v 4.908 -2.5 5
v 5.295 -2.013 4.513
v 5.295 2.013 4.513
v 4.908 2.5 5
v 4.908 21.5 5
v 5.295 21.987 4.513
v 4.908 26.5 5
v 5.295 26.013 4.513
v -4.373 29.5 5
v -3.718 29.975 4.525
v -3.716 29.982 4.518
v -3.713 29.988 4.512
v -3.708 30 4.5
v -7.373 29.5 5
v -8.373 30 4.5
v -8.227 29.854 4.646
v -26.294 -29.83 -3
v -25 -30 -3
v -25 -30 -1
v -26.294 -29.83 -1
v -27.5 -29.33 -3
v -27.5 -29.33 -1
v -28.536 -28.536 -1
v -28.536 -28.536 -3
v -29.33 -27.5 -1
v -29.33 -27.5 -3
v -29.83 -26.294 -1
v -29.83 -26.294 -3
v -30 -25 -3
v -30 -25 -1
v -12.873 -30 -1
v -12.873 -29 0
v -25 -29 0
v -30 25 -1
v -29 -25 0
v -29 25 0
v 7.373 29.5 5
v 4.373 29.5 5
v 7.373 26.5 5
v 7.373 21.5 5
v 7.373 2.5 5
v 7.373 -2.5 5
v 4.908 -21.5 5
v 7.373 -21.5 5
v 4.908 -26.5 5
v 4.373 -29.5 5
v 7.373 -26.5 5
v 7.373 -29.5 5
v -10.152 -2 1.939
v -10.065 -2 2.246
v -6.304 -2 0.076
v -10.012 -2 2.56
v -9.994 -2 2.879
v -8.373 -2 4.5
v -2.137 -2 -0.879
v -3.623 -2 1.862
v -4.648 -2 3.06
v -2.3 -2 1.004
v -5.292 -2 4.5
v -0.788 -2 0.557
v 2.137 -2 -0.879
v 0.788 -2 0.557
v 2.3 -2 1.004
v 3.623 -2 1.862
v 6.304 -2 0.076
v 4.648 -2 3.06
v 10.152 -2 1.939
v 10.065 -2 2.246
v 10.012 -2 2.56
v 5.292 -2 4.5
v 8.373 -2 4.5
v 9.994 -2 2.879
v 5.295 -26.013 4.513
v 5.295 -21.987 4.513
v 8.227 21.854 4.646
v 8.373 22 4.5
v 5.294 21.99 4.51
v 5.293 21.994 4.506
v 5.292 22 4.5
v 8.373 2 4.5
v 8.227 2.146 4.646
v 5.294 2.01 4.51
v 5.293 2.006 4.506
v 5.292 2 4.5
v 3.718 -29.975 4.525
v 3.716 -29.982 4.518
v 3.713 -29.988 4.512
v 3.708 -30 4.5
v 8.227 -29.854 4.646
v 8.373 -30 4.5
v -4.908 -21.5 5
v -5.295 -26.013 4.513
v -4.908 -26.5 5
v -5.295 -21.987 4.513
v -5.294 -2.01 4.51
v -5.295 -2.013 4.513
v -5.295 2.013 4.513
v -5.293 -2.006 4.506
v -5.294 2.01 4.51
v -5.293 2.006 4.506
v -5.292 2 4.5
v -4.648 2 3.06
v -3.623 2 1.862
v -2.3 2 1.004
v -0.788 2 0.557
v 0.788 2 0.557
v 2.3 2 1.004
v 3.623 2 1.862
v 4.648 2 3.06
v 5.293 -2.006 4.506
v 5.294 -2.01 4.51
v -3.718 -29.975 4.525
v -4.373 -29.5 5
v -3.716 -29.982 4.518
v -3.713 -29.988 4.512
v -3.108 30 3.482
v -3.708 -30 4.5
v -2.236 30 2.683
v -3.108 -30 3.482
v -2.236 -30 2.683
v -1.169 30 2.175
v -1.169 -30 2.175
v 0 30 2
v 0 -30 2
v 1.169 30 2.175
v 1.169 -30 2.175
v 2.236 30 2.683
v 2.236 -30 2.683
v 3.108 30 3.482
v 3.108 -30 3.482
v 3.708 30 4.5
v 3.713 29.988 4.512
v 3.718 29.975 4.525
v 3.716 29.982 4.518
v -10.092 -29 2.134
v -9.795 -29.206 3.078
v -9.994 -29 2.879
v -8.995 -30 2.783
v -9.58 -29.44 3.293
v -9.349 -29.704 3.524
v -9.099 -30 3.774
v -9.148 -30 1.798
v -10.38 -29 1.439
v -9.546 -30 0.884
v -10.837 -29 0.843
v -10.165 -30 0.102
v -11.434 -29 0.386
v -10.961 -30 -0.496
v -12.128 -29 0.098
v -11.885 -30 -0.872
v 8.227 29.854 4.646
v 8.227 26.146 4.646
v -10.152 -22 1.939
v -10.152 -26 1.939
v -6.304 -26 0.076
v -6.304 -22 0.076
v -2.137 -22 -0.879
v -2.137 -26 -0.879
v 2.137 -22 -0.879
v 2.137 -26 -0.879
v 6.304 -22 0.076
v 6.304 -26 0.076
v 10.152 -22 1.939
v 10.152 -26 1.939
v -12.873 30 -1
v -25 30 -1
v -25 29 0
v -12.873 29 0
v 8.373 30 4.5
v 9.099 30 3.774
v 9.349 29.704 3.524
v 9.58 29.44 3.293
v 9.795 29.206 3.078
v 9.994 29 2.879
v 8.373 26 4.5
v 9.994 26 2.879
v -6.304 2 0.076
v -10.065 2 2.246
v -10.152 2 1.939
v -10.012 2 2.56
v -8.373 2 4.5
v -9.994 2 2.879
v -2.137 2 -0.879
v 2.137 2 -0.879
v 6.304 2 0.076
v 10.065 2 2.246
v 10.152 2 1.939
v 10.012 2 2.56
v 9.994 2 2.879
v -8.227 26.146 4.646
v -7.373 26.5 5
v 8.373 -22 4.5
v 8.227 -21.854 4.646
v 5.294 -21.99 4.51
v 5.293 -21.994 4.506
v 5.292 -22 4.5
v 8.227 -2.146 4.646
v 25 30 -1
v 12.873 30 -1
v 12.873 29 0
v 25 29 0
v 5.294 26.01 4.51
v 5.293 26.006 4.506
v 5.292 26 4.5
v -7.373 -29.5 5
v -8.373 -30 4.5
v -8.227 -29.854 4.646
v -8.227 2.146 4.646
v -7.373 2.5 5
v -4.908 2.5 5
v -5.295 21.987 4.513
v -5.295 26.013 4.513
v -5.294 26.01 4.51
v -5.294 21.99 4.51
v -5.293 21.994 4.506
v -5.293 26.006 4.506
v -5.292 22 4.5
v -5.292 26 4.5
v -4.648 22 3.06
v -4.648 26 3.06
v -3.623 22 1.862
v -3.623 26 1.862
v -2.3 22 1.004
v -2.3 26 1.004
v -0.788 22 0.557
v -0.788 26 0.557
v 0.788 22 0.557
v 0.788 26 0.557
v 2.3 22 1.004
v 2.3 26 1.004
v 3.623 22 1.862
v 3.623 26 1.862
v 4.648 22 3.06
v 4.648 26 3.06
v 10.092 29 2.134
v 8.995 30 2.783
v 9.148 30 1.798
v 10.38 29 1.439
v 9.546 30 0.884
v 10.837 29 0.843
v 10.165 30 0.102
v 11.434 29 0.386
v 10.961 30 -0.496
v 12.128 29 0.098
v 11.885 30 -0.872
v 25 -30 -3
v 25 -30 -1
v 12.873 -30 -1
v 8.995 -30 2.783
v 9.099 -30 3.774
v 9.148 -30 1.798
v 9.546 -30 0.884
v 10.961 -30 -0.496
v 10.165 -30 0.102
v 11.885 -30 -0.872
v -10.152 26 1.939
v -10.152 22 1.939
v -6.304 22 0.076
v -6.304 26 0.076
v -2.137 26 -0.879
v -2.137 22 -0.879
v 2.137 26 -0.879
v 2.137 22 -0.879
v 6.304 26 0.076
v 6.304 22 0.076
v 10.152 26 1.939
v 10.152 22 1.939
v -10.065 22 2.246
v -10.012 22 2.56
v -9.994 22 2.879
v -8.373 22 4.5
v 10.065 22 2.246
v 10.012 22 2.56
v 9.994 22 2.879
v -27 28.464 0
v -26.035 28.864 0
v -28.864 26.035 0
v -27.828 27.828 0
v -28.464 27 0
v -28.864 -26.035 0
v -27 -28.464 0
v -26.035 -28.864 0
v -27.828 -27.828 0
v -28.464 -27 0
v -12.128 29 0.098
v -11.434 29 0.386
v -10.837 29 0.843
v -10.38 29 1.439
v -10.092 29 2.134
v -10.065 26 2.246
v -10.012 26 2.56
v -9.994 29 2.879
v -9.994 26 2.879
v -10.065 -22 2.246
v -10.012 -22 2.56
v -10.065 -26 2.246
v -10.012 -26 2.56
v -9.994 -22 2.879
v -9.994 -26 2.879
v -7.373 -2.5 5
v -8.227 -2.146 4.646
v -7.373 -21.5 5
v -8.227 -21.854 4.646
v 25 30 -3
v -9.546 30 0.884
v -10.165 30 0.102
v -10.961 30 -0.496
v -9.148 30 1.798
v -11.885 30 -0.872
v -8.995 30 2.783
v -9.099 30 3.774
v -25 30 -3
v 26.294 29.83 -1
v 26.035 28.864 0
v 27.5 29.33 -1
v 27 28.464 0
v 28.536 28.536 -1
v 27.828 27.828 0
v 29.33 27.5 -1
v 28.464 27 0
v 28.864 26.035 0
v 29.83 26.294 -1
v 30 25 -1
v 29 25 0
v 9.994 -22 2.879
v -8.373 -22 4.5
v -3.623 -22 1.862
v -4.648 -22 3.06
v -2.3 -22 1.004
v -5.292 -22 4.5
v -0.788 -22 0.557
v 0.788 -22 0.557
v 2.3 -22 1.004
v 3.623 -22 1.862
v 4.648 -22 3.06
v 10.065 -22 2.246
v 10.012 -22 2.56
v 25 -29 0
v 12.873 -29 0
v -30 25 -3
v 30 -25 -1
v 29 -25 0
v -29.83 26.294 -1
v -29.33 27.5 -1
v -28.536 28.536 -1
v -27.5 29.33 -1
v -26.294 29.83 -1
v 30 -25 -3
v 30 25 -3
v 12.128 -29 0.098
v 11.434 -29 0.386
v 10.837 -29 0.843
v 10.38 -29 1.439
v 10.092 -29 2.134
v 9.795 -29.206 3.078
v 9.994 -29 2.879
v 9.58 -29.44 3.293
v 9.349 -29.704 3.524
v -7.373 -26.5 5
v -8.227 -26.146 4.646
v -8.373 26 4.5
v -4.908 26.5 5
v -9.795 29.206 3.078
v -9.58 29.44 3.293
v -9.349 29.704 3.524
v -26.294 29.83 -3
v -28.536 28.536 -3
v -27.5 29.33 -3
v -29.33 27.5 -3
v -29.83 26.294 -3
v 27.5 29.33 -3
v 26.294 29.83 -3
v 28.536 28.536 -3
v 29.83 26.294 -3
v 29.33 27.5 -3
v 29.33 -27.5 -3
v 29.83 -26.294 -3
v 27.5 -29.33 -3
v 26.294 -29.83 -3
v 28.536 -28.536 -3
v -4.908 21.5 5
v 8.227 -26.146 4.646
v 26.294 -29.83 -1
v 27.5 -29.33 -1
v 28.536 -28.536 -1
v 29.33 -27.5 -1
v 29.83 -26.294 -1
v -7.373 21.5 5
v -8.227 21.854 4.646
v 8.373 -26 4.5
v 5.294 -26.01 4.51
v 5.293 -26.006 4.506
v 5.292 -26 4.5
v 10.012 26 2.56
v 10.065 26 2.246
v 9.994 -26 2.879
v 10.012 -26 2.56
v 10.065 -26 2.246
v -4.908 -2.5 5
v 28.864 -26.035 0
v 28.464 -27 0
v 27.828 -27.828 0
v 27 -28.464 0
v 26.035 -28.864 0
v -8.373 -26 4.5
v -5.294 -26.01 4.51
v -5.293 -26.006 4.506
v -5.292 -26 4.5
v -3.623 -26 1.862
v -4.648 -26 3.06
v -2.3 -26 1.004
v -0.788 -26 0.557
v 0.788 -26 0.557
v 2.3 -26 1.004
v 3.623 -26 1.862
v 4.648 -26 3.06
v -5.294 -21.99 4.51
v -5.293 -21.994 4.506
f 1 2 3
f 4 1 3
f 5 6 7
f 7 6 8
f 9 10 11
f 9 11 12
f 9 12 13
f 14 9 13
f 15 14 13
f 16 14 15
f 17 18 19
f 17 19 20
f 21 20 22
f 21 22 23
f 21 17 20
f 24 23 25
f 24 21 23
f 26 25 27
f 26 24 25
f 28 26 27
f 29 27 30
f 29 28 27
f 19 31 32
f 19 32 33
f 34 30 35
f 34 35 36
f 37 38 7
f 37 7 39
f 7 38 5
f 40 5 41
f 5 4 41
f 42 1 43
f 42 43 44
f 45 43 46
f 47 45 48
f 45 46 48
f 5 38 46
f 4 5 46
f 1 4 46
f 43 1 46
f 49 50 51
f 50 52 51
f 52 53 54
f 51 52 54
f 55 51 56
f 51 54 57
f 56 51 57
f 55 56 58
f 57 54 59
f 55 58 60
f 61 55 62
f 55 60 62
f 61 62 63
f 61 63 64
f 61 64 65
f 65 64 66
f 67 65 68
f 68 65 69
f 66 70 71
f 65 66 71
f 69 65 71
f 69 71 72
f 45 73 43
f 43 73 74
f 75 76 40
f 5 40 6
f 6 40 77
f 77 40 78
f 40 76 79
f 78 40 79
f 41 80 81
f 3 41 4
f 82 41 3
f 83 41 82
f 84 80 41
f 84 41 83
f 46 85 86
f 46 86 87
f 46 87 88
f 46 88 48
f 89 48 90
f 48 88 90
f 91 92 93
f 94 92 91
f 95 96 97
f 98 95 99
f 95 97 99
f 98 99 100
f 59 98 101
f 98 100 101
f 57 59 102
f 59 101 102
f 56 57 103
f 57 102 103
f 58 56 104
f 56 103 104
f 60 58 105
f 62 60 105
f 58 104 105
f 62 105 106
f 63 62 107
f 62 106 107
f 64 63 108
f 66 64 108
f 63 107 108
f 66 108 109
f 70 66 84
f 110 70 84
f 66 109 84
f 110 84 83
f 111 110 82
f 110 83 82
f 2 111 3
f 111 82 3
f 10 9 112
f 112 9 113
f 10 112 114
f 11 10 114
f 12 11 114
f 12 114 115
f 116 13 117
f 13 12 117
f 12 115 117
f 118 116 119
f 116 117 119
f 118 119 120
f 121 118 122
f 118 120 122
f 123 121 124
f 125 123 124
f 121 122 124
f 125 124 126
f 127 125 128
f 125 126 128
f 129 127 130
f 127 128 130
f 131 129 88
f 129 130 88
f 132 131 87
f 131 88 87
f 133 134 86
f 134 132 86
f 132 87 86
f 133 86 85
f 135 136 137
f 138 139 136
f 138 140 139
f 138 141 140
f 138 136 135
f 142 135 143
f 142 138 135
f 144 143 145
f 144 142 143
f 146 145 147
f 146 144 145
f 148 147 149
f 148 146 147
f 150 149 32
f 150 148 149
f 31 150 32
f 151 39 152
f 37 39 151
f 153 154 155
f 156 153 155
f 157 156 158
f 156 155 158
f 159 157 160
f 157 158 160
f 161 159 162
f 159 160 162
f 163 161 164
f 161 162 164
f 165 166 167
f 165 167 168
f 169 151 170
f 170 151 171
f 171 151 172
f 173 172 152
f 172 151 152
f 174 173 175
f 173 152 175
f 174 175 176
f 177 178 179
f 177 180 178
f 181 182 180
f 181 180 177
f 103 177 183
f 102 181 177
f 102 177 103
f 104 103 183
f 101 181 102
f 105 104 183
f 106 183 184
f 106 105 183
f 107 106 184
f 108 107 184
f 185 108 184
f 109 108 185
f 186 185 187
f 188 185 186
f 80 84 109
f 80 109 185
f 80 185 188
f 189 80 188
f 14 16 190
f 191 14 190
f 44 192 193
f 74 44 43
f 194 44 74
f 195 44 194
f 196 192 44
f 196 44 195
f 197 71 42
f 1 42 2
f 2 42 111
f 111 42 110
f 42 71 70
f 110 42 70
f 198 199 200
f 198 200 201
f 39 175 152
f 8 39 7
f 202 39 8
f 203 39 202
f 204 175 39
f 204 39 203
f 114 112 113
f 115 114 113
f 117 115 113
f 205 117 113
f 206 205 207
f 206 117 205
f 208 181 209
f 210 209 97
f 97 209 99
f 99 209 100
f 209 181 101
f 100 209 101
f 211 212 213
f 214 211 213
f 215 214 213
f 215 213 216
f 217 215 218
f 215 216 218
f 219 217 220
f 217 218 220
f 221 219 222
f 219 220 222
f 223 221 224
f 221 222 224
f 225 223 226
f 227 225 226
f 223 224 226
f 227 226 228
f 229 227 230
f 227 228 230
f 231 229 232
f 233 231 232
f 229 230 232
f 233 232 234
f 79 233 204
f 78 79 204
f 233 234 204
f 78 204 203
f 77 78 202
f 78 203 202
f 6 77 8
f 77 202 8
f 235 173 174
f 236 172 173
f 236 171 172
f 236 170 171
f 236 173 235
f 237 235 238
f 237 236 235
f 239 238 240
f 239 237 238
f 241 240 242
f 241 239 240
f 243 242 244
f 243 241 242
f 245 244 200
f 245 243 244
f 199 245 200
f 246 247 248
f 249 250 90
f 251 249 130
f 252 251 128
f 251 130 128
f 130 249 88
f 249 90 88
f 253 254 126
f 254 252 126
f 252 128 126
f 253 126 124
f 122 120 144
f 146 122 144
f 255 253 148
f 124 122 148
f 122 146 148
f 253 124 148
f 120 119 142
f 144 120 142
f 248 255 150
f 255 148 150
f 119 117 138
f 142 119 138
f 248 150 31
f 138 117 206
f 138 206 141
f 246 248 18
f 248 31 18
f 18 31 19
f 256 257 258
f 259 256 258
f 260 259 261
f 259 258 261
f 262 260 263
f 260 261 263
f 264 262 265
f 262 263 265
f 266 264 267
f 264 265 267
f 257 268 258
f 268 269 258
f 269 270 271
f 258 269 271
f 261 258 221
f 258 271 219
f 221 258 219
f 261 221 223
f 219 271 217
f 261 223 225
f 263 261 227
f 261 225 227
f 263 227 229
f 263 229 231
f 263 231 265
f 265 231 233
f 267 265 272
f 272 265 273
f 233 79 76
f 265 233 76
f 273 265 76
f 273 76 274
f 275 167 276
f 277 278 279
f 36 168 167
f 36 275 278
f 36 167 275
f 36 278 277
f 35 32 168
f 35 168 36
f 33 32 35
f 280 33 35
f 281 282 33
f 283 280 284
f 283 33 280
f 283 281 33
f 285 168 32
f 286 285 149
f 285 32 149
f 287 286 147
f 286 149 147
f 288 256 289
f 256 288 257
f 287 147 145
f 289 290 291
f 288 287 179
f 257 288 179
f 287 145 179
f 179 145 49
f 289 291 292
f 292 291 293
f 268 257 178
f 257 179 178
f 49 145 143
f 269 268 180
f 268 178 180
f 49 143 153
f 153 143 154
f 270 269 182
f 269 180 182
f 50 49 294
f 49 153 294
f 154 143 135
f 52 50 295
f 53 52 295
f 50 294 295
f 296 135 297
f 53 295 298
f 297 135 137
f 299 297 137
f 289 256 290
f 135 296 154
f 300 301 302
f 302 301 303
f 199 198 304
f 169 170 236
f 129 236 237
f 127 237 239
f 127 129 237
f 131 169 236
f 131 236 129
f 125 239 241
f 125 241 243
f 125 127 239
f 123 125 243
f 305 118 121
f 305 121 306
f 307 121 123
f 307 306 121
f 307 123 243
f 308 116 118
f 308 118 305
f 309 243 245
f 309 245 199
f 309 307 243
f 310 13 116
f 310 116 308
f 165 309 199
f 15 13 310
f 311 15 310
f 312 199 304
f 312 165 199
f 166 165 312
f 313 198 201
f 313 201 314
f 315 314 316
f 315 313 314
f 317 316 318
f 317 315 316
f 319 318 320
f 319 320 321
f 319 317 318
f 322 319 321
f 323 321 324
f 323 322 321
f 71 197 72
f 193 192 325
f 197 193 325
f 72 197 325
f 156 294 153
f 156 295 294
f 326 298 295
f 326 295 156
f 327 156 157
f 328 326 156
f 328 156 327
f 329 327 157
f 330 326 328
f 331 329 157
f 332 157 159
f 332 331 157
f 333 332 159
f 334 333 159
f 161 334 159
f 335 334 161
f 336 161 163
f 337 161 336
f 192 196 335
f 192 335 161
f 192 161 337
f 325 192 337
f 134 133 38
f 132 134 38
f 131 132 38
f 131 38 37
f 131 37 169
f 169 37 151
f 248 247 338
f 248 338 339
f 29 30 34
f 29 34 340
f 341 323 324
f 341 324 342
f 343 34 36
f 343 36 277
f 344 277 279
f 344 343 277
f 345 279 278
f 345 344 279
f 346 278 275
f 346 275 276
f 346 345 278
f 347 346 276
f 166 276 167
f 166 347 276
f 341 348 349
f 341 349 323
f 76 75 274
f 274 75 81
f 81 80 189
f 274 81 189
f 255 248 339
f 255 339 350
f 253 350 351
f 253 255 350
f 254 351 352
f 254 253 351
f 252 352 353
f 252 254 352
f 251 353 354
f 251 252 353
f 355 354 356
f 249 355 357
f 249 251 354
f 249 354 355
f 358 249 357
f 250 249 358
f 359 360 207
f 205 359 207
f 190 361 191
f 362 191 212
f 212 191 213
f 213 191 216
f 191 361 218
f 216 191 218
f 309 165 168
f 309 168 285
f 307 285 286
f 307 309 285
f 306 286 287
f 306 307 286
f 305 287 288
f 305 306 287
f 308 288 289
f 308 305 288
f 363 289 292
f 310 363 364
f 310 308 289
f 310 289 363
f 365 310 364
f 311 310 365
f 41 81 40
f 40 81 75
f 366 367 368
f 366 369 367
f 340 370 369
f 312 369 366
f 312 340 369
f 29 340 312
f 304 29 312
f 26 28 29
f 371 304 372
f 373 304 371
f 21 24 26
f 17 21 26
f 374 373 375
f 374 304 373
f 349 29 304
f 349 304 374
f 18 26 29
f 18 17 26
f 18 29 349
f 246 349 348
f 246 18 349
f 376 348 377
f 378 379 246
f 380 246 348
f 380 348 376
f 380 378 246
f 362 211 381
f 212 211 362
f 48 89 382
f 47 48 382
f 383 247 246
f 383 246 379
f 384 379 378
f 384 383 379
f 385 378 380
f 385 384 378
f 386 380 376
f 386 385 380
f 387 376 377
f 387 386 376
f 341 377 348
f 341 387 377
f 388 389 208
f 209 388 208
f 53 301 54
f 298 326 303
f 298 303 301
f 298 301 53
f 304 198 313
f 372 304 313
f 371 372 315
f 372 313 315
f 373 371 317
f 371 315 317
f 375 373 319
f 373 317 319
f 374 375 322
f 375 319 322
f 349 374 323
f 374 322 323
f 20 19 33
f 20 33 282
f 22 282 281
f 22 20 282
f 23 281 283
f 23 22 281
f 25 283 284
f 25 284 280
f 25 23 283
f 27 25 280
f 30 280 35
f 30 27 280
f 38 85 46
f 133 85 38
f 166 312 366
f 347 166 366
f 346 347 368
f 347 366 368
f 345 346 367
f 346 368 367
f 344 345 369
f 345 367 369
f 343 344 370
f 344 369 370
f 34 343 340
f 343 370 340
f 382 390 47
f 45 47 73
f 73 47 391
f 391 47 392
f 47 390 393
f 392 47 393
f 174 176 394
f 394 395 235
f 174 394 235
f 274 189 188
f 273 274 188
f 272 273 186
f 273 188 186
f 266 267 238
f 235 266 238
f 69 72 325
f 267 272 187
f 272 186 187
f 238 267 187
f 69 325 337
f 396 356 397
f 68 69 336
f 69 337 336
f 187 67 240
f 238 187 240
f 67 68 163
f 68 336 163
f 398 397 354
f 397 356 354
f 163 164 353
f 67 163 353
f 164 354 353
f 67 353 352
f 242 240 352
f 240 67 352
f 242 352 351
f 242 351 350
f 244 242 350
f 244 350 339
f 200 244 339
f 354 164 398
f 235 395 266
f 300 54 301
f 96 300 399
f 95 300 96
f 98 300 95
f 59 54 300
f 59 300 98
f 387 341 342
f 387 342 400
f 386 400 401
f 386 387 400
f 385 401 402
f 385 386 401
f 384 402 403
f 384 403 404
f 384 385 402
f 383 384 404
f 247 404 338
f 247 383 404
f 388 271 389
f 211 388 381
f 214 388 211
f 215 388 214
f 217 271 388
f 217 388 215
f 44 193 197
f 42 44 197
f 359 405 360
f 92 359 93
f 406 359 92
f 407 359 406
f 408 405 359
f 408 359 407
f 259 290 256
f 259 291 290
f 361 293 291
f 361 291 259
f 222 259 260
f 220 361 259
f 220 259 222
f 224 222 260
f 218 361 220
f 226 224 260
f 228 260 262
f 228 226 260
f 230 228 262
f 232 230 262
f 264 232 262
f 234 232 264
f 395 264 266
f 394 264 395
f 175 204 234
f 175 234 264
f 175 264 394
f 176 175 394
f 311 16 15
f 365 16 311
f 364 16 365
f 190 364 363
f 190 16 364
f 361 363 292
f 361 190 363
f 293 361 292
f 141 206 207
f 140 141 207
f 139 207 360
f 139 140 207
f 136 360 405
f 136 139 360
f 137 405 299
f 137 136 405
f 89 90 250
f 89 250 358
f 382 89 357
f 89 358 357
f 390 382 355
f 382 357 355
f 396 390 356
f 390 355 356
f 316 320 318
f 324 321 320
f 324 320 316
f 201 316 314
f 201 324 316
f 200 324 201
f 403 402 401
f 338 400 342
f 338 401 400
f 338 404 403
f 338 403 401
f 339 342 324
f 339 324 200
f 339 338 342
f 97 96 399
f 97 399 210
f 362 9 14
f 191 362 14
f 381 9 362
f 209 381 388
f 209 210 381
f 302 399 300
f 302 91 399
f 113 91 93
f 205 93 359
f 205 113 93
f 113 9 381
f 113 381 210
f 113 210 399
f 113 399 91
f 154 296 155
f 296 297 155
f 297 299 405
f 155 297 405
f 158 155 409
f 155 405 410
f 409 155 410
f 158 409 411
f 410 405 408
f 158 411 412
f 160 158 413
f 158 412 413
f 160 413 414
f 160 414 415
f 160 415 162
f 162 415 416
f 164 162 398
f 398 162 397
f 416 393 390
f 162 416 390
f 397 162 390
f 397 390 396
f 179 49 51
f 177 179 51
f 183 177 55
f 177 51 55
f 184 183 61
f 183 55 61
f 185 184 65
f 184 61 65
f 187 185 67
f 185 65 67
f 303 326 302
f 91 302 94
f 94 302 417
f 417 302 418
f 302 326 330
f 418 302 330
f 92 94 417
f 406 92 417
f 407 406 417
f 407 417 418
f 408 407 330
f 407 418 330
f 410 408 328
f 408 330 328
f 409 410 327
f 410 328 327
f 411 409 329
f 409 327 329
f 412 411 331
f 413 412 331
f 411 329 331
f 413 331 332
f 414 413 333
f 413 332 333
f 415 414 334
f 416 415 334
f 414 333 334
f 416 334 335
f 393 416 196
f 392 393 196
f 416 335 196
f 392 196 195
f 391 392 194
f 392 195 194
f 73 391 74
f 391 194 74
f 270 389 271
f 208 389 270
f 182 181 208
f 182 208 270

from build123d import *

# Parameters (mm, degrees)
PAD_DEPTH              = 30
SKETCH001_R            = 19
SKETCH001_R_2          = 5.5
POCKET_DEPTH           = 2
LINEARPATTERN_COUNT    = 2
LINEARPATTERN_PITCH    = 24
LINEARPATTERN001_COUNT = 2
LINEARPATTERN001_PITCH = 24
FILLET_R               = 5
CHAMFER_SIZE           = 0.5
CHAMFER001_SIZE        = 1


with BuildPart() as part:
    # Sketch → Pad (new body, symmetric)
    with BuildSketch(Plane.XZ):
        with BuildLine():
            ThreePointArc((-3.872983, 5), (0, 2), (3.872983, 5))
            Line((3.872983, 5), (7.872983, 5))
            Line((7.872983, 5), (9.994304, 2.87868))
            ThreePointArc((9.994304, 2.87868), (10.837449, 0.843146), (12.872983, 0))
            Line((30, 0), (12.872983, 0))
            Line((30, -3), (30, 0))
            Line((-30, -3), (30, -3))
            Line((-30, 0), (-30, -3))
            Line((-12.872983, 0), (-30, 0))
            ThreePointArc((-12.872983, 0), (-10.837449, 0.843146), (-9.994304, 2.87868))
            Line((-7.872983, 5), (-9.994304, 2.87868))
            Line((-3.872983, 5), (-7.872983, 5))
        make_face()
    extrude(amount=PAD_DEPTH, both=True)

    # Sketch001 → Pocket (cut, symmetric)
    with BuildSketch(Plane.XZ):
        with Locations((0, 18)):
            Circle(SKETCH001_R)
        with Locations((0, 6)):
            Circle(SKETCH001_R_2, mode=Mode.SUBTRACT)
    pocket = extrude(amount=POCKET_DEPTH, both=True, mode=Mode.SUBTRACT)

    # LinearPattern: Pocket ×2
    with Locations(*[(0, -i * LINEARPATTERN_PITCH, 0) for i in range(1, LINEARPATTERN_COUNT)]):
        add(pocket, mode=Mode.SUBTRACT)

    # LinearPattern001: Pocket ×2
    with Locations(*[(0, i * LINEARPATTERN001_PITCH, 0) for i in range(1, LINEARPATTERN001_COUNT)]):
        add(pocket, mode=Mode.SUBTRACT)

    # Fillet
    fillet_edges = [part.edges().sort_by_distance(p)[0] for p in [
        (30, -30, -1.5),
        (30, 30, -1.5),
        (-30, -30, -1.5),
        (-30, 30, -1.5),
    ]]
    fillet(fillet_edges, radius=FILLET_R)

    # Chamfer
    chamfer_edges = [part.edges().sort_by_distance(p)[0] for p in [
        (-5.872983, 30, 5),
        (-7.872983, 28, 5),
        (-6.640655, 26, 5),
        (-5.408327, 24, 5),
        (-6.640655, 22, 5),
        (-7.872983, 12, 5),
        (-6.640655, 2, 5),
        (-5.408327, 0, 5),
        (-6.640655, -2, 5),
        (-7.872983, -12, 5),
        (-6.640655, -22, 5),
        (-5.408327, -24, 5),
        (-6.640655, -26, 5),
        (-7.872983, -28, 5),
        (-5.872983, -30, 5),
        (-3.872983, 0, 5),
        (5.872983, 30, 5),
        (7.872983, 28, 5),
        (6.640655, 26, 5),
        (5.408327, 24, 5),
        (6.640655, 22, 5),
        (7.872983, 12, 5),
        (6.640655, 2, 5),
        (5.408327, 0, 5),
        (6.640655, -2, 5),
        (7.872983, -12, 5),
        (6.640655, -22, 5),
        (5.408327, -24, 5),
        (6.640655, -26, 5),
        (7.872983, -28, 5),
        (5.872983, -30, 5),
        (3.872983, 0, 5),
    ]]
    chamfer(chamfer_edges, length=CHAMFER_SIZE)

    # Chamfer001
    chamfer001_edges = [part.edges().sort_by_distance(p)[0] for p in [
        (18.936492, -30, 0),
        (-18.936492, -30, 0),
    ]]
    chamfer(chamfer001_edges, length=CHAMFER001_SIZE)


solid = part.part
